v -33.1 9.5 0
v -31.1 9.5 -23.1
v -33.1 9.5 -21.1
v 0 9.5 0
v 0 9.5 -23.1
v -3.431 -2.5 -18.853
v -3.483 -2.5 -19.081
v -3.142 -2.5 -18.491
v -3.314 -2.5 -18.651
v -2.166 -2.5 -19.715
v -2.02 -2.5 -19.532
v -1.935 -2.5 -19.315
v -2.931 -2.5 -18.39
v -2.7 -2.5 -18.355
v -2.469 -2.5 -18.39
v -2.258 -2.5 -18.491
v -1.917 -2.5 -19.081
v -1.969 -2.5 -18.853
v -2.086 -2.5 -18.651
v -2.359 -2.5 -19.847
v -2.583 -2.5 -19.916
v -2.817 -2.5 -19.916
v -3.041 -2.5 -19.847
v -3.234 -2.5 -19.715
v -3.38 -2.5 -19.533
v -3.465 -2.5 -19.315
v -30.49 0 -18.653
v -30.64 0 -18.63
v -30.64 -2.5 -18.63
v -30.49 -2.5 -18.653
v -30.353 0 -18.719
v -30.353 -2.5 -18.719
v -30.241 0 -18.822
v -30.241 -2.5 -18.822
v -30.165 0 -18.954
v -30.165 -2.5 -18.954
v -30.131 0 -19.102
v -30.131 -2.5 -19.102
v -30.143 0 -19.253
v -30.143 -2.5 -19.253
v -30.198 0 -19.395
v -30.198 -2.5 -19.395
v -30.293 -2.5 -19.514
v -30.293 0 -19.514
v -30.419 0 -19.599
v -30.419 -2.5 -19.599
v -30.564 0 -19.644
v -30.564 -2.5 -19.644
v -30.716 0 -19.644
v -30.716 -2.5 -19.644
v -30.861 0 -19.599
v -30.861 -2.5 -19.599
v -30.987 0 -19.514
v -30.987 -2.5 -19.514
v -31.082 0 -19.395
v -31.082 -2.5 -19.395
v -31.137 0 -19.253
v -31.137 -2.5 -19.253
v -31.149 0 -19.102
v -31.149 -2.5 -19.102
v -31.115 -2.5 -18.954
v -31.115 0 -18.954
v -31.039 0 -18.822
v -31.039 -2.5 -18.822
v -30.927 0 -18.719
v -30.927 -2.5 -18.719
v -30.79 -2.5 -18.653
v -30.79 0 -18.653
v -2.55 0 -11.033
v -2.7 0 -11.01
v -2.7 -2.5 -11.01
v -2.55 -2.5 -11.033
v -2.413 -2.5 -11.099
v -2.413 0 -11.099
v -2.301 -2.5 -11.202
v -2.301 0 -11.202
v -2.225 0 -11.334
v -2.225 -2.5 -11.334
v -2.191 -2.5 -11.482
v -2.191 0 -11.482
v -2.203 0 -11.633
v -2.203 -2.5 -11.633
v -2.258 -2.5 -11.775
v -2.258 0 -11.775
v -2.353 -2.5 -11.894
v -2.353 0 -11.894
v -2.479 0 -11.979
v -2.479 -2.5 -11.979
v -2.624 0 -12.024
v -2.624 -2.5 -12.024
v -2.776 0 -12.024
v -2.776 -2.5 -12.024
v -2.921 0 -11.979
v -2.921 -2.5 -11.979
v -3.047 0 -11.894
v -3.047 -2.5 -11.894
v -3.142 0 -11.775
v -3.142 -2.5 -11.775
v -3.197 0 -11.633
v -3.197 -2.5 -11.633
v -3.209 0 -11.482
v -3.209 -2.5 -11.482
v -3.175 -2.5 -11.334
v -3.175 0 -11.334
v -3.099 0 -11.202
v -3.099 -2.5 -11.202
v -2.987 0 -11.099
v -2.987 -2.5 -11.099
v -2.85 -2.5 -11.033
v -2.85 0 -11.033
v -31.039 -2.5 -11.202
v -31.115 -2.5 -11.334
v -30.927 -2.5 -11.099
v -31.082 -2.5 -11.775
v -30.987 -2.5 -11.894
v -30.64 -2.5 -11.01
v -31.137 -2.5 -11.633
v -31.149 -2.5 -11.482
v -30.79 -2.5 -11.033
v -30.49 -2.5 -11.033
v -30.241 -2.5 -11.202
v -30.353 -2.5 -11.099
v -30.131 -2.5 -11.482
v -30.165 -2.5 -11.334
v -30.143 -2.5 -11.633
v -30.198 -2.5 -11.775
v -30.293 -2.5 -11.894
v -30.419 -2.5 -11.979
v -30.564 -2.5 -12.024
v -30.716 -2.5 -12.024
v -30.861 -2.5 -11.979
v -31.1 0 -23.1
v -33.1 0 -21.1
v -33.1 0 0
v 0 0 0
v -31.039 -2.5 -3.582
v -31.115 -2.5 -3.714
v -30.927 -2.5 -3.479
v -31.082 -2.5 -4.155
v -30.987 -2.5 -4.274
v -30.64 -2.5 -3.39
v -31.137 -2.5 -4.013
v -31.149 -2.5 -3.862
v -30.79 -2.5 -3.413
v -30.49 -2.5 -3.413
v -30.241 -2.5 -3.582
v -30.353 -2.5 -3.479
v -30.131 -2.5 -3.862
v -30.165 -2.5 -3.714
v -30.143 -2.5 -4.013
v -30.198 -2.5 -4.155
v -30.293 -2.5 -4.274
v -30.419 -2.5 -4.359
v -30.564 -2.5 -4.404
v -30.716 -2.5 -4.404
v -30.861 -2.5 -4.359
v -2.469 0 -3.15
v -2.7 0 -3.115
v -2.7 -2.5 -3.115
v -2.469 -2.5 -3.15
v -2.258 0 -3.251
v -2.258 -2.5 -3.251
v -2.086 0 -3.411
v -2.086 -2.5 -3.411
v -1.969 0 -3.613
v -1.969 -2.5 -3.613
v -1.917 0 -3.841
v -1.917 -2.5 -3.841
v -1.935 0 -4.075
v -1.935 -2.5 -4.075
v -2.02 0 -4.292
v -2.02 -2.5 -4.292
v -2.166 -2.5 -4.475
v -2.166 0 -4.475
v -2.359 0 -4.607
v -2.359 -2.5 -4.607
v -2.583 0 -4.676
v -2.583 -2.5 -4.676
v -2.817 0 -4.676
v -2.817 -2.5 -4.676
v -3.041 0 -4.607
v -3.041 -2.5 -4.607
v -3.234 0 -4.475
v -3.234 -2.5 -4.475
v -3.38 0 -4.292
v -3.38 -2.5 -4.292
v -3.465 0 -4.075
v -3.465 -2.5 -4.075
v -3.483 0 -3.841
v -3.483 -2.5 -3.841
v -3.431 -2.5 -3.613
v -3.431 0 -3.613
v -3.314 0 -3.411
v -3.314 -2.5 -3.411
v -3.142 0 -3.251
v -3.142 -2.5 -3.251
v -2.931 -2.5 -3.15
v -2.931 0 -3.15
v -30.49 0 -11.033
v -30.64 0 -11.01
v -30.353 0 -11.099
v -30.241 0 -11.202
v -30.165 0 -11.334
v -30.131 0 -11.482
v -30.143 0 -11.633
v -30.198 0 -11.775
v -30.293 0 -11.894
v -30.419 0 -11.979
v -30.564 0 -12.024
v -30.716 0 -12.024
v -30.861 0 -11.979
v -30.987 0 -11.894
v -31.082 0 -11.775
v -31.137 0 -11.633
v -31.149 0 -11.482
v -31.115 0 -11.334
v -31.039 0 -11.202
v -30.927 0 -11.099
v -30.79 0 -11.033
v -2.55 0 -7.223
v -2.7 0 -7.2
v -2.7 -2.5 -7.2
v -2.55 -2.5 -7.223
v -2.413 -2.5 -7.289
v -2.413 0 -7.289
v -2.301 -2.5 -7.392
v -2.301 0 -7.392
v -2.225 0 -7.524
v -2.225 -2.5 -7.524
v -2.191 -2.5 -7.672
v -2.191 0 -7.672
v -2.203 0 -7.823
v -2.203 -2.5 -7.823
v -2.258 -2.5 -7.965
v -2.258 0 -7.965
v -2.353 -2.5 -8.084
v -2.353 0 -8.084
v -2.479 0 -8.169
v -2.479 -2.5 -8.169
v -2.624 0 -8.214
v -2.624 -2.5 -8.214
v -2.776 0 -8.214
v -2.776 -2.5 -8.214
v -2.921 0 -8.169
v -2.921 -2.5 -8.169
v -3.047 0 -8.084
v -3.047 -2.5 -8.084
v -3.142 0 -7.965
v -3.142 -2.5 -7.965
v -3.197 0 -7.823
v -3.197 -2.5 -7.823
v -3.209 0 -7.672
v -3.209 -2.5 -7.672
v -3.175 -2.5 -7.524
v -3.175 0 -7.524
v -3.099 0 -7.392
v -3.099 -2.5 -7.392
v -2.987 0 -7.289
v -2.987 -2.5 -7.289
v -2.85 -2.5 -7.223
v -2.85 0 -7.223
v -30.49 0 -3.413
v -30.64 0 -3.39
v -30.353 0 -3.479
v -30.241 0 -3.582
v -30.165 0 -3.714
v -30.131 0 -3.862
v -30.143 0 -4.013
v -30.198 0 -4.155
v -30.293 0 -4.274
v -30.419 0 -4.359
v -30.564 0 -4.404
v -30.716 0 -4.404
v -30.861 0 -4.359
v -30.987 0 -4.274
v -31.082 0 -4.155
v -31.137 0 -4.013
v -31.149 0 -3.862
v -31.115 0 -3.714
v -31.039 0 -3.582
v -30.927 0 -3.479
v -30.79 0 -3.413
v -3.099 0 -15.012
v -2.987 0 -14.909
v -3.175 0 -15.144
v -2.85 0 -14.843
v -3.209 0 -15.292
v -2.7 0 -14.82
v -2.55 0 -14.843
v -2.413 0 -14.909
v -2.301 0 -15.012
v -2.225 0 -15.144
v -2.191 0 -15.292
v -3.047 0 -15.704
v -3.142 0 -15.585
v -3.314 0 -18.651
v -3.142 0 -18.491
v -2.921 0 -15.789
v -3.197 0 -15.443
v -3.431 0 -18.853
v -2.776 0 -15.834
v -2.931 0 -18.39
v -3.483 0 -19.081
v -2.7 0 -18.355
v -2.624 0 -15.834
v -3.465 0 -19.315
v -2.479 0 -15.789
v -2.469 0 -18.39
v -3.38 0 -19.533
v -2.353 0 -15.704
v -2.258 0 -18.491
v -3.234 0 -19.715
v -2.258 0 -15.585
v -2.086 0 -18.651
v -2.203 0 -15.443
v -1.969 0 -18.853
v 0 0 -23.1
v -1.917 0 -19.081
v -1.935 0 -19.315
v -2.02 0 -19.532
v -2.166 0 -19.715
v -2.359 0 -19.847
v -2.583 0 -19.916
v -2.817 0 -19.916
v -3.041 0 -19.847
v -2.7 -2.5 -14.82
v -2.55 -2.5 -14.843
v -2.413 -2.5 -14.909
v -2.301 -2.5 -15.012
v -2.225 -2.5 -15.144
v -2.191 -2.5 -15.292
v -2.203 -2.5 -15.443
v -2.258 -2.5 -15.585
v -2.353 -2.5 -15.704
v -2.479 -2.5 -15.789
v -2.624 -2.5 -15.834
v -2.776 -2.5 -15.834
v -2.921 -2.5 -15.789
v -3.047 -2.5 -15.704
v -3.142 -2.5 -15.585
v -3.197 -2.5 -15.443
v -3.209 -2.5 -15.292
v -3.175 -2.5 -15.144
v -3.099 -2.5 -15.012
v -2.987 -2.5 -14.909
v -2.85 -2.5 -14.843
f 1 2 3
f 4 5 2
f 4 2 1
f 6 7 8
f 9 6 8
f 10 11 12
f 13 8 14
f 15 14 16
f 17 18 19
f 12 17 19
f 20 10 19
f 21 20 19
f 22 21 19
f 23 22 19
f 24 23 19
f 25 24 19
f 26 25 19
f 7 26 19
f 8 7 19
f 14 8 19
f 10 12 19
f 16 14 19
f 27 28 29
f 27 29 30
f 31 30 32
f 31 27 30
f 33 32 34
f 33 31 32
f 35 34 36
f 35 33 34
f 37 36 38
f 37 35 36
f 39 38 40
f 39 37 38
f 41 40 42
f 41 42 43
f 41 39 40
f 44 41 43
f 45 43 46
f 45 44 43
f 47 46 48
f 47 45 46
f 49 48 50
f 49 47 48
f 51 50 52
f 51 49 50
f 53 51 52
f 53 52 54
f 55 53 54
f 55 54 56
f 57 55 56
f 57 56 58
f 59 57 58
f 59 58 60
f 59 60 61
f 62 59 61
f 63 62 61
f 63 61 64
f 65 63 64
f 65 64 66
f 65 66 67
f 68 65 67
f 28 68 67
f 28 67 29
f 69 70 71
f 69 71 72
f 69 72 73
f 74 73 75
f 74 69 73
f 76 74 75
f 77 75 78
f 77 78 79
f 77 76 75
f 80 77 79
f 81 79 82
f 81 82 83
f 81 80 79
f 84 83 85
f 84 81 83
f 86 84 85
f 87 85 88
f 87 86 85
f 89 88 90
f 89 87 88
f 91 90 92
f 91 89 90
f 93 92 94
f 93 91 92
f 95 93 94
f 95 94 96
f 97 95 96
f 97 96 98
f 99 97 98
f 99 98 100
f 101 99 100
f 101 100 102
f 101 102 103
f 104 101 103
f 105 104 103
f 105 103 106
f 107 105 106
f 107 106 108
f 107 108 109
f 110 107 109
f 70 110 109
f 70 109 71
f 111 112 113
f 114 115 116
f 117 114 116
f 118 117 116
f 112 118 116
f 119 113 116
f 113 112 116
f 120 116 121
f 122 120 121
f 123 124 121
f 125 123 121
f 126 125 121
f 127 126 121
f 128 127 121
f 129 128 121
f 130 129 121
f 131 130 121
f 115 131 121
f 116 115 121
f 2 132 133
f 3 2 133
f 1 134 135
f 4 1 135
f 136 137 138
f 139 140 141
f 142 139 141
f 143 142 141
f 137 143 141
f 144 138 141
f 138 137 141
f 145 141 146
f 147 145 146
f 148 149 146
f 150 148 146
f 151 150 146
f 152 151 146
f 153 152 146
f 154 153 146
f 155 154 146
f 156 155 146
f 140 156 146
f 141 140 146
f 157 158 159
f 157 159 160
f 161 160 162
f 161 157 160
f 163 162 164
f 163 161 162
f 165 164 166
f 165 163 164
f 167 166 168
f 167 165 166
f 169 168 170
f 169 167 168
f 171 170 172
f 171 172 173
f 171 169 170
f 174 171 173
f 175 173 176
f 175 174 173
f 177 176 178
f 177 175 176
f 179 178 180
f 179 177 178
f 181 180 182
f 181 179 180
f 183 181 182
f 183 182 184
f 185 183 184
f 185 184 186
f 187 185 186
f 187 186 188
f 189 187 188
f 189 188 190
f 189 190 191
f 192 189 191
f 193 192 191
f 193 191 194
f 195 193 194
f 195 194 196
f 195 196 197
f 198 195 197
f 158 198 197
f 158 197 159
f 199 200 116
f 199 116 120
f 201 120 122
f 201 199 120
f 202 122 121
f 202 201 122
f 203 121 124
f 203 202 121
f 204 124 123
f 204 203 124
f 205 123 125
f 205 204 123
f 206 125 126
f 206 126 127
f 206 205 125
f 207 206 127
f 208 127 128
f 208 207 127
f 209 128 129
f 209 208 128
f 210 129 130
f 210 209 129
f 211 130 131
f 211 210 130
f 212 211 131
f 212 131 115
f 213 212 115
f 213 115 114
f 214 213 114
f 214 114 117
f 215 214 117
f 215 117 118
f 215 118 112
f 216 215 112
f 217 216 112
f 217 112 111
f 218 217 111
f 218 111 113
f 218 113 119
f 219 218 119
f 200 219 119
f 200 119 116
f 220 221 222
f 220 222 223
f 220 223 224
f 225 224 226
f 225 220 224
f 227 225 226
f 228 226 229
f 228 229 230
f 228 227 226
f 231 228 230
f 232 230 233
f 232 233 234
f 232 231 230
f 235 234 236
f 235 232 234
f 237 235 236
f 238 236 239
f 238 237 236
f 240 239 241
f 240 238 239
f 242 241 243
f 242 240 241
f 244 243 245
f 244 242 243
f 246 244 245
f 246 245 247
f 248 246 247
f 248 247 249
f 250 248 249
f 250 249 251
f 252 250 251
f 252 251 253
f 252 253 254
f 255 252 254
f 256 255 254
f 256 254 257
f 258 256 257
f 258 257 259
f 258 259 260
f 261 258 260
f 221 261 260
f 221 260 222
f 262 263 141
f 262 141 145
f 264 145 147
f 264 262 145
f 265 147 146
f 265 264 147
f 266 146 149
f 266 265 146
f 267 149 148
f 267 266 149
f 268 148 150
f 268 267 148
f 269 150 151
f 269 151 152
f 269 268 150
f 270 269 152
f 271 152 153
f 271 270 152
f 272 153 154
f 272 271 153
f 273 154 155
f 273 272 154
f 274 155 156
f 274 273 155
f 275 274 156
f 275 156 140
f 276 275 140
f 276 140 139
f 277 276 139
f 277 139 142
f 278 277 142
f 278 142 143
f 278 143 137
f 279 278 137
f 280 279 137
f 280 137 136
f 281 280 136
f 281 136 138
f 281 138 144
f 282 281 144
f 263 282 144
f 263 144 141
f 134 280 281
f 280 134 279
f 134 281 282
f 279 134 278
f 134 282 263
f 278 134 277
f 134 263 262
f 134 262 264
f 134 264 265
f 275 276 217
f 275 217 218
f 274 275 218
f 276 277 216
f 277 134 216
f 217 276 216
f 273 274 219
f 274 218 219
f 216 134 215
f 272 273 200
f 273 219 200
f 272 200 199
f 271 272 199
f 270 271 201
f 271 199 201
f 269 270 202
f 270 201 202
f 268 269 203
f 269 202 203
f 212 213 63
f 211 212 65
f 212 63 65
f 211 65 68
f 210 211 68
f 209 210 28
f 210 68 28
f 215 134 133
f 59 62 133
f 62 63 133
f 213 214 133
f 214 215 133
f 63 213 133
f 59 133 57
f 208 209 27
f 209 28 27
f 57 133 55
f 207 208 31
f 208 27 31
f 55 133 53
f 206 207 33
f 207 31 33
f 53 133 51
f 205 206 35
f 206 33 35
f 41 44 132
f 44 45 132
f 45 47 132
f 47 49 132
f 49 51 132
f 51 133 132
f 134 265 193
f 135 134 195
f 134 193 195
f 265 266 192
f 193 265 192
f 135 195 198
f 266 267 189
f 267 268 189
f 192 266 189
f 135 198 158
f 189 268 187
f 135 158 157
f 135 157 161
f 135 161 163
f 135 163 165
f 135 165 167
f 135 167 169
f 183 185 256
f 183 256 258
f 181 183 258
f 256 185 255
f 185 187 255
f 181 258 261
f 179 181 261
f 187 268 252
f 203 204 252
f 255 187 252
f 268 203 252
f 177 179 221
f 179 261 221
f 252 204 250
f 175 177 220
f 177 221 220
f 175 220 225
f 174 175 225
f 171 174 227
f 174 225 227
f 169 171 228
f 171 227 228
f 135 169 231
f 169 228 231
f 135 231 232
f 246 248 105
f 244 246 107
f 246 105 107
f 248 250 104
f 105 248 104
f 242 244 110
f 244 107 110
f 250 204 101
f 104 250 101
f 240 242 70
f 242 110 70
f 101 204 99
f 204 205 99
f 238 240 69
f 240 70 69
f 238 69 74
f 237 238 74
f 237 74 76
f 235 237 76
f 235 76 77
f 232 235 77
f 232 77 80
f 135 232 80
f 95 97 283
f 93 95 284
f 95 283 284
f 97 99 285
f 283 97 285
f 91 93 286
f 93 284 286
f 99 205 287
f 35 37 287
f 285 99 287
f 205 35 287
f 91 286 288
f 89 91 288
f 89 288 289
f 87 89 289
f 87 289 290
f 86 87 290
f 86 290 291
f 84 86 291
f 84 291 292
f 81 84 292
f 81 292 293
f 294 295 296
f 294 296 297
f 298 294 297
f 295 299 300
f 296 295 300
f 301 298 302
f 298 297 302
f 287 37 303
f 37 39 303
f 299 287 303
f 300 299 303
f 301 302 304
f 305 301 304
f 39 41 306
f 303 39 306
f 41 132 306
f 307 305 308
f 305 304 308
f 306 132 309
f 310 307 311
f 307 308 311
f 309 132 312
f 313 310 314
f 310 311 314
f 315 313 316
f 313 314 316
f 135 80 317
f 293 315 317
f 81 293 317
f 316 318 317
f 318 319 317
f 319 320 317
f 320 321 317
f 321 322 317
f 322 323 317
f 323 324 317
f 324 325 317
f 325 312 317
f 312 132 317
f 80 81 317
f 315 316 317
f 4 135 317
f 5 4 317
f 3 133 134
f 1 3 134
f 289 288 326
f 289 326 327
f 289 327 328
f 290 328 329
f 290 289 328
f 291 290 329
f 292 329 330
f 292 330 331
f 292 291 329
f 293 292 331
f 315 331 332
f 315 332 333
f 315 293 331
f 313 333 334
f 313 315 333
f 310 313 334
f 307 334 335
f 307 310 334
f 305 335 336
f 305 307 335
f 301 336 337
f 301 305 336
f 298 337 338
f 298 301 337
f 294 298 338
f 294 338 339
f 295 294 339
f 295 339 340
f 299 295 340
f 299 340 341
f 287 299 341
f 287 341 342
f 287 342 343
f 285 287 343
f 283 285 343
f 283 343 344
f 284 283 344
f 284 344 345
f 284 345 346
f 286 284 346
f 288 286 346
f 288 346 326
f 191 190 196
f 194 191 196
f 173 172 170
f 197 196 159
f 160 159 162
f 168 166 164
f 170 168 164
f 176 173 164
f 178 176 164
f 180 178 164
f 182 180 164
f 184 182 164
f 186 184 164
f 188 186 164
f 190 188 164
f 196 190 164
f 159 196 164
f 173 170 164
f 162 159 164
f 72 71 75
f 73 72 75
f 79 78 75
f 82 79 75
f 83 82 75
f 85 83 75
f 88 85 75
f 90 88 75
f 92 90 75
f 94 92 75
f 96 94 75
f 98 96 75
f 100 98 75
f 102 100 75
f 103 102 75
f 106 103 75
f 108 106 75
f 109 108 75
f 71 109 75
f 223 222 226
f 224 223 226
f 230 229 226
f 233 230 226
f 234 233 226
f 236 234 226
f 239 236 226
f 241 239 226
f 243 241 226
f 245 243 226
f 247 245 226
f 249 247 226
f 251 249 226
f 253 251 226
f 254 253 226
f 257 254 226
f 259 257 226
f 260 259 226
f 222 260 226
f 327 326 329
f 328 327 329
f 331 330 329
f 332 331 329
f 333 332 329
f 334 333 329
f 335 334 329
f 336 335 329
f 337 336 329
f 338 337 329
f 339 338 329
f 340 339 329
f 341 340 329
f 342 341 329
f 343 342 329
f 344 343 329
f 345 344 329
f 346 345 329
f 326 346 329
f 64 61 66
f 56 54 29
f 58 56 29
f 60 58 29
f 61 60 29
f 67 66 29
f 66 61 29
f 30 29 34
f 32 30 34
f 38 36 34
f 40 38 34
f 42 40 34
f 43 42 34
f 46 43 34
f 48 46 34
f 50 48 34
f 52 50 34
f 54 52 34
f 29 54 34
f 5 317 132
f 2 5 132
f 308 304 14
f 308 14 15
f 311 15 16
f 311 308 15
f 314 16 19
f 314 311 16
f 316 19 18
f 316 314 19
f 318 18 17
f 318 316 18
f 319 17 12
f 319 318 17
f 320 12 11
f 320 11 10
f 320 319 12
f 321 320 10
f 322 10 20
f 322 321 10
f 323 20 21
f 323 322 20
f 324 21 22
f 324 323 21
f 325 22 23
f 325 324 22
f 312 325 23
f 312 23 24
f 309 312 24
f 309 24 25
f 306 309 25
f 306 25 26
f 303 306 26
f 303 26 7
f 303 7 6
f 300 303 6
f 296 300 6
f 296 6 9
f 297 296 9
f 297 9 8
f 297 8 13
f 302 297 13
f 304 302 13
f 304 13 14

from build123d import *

# Parameters (mm, degrees)
BOSS_EXTRUDE1_DEPTH = 9.5
SKETCH4_R           = 0.785
SKETCH4_R_2         = 0.51
BOSS_EXTRUDE2_DEPTH = 12


with BuildPart() as part:
    # Sketch1 → Boss-Extrude1 (new body)
    with BuildSketch(Plane(origin=(0, 0, 0), x_dir=(1, 0, 0), z_dir=(0, 1, 0))):
        Polygon((-31.1, 23.1), (-33.1, 21.1), (-33.1, 0), (0, 0), (0, 23.1), align=None)
    extrude(amount=BOSS_EXTRUDE1_DEPTH)

    # Sketch4 → Boss-Extrude2 (add)
    with BuildSketch(Plane(origin=(0, 9.5, 0), x_dir=(1, 0, 0), z_dir=(0, 1, 0))):
        with Locations(Location((-2.7, 19.14, 0), (0, 0, 270))):
            Circle(SKETCH4_R)
        with Locations((-2.7, 19.14)):
            Circle(SKETCH4_R_2, mode=Mode.SUBTRACT)
        with Locations((-2.7, 19.14)):
            Circle(SKETCH4_R_2)
        with Locations(Location((-2.7, 15.33, 0), (0, 0, 270))):
            Circle(SKETCH4_R_2)
        with Locations(Location((-2.7, 3.9, 0), (0, 0, 270))):
            Circle(SKETCH4_R)
        with Locations((-2.7, 3.9)):
            Circle(SKETCH4_R_2, mode=Mode.SUBTRACT)
        with Locations((-2.7, 3.9)):
            Circle(SKETCH4_R_2)
        with Locations(Location((-2.7, 7.71, 0), (0, 0, 270))):
            Circle(SKETCH4_R_2)
        with Locations(Location((-2.7, 11.52, 0), (0, 0, 270))):
            Circle(SKETCH4_R_2)
        with Locations(Location((-30.64, 3.9, 0), (0, 0, 270))):
            Circle(SKETCH4_R_2)
        with Locations(Location((-30.64, 19.14, 0), (0, 0, 270))):
            Circle(SKETCH4_R_2)
        with Locations(Location((-30.64, 11.52, 0), (0, 0, 270))):
            Circle(SKETCH4_R_2)
    extrude(amount=-BOSS_EXTRUDE2_DEPTH)


solid = part.part
